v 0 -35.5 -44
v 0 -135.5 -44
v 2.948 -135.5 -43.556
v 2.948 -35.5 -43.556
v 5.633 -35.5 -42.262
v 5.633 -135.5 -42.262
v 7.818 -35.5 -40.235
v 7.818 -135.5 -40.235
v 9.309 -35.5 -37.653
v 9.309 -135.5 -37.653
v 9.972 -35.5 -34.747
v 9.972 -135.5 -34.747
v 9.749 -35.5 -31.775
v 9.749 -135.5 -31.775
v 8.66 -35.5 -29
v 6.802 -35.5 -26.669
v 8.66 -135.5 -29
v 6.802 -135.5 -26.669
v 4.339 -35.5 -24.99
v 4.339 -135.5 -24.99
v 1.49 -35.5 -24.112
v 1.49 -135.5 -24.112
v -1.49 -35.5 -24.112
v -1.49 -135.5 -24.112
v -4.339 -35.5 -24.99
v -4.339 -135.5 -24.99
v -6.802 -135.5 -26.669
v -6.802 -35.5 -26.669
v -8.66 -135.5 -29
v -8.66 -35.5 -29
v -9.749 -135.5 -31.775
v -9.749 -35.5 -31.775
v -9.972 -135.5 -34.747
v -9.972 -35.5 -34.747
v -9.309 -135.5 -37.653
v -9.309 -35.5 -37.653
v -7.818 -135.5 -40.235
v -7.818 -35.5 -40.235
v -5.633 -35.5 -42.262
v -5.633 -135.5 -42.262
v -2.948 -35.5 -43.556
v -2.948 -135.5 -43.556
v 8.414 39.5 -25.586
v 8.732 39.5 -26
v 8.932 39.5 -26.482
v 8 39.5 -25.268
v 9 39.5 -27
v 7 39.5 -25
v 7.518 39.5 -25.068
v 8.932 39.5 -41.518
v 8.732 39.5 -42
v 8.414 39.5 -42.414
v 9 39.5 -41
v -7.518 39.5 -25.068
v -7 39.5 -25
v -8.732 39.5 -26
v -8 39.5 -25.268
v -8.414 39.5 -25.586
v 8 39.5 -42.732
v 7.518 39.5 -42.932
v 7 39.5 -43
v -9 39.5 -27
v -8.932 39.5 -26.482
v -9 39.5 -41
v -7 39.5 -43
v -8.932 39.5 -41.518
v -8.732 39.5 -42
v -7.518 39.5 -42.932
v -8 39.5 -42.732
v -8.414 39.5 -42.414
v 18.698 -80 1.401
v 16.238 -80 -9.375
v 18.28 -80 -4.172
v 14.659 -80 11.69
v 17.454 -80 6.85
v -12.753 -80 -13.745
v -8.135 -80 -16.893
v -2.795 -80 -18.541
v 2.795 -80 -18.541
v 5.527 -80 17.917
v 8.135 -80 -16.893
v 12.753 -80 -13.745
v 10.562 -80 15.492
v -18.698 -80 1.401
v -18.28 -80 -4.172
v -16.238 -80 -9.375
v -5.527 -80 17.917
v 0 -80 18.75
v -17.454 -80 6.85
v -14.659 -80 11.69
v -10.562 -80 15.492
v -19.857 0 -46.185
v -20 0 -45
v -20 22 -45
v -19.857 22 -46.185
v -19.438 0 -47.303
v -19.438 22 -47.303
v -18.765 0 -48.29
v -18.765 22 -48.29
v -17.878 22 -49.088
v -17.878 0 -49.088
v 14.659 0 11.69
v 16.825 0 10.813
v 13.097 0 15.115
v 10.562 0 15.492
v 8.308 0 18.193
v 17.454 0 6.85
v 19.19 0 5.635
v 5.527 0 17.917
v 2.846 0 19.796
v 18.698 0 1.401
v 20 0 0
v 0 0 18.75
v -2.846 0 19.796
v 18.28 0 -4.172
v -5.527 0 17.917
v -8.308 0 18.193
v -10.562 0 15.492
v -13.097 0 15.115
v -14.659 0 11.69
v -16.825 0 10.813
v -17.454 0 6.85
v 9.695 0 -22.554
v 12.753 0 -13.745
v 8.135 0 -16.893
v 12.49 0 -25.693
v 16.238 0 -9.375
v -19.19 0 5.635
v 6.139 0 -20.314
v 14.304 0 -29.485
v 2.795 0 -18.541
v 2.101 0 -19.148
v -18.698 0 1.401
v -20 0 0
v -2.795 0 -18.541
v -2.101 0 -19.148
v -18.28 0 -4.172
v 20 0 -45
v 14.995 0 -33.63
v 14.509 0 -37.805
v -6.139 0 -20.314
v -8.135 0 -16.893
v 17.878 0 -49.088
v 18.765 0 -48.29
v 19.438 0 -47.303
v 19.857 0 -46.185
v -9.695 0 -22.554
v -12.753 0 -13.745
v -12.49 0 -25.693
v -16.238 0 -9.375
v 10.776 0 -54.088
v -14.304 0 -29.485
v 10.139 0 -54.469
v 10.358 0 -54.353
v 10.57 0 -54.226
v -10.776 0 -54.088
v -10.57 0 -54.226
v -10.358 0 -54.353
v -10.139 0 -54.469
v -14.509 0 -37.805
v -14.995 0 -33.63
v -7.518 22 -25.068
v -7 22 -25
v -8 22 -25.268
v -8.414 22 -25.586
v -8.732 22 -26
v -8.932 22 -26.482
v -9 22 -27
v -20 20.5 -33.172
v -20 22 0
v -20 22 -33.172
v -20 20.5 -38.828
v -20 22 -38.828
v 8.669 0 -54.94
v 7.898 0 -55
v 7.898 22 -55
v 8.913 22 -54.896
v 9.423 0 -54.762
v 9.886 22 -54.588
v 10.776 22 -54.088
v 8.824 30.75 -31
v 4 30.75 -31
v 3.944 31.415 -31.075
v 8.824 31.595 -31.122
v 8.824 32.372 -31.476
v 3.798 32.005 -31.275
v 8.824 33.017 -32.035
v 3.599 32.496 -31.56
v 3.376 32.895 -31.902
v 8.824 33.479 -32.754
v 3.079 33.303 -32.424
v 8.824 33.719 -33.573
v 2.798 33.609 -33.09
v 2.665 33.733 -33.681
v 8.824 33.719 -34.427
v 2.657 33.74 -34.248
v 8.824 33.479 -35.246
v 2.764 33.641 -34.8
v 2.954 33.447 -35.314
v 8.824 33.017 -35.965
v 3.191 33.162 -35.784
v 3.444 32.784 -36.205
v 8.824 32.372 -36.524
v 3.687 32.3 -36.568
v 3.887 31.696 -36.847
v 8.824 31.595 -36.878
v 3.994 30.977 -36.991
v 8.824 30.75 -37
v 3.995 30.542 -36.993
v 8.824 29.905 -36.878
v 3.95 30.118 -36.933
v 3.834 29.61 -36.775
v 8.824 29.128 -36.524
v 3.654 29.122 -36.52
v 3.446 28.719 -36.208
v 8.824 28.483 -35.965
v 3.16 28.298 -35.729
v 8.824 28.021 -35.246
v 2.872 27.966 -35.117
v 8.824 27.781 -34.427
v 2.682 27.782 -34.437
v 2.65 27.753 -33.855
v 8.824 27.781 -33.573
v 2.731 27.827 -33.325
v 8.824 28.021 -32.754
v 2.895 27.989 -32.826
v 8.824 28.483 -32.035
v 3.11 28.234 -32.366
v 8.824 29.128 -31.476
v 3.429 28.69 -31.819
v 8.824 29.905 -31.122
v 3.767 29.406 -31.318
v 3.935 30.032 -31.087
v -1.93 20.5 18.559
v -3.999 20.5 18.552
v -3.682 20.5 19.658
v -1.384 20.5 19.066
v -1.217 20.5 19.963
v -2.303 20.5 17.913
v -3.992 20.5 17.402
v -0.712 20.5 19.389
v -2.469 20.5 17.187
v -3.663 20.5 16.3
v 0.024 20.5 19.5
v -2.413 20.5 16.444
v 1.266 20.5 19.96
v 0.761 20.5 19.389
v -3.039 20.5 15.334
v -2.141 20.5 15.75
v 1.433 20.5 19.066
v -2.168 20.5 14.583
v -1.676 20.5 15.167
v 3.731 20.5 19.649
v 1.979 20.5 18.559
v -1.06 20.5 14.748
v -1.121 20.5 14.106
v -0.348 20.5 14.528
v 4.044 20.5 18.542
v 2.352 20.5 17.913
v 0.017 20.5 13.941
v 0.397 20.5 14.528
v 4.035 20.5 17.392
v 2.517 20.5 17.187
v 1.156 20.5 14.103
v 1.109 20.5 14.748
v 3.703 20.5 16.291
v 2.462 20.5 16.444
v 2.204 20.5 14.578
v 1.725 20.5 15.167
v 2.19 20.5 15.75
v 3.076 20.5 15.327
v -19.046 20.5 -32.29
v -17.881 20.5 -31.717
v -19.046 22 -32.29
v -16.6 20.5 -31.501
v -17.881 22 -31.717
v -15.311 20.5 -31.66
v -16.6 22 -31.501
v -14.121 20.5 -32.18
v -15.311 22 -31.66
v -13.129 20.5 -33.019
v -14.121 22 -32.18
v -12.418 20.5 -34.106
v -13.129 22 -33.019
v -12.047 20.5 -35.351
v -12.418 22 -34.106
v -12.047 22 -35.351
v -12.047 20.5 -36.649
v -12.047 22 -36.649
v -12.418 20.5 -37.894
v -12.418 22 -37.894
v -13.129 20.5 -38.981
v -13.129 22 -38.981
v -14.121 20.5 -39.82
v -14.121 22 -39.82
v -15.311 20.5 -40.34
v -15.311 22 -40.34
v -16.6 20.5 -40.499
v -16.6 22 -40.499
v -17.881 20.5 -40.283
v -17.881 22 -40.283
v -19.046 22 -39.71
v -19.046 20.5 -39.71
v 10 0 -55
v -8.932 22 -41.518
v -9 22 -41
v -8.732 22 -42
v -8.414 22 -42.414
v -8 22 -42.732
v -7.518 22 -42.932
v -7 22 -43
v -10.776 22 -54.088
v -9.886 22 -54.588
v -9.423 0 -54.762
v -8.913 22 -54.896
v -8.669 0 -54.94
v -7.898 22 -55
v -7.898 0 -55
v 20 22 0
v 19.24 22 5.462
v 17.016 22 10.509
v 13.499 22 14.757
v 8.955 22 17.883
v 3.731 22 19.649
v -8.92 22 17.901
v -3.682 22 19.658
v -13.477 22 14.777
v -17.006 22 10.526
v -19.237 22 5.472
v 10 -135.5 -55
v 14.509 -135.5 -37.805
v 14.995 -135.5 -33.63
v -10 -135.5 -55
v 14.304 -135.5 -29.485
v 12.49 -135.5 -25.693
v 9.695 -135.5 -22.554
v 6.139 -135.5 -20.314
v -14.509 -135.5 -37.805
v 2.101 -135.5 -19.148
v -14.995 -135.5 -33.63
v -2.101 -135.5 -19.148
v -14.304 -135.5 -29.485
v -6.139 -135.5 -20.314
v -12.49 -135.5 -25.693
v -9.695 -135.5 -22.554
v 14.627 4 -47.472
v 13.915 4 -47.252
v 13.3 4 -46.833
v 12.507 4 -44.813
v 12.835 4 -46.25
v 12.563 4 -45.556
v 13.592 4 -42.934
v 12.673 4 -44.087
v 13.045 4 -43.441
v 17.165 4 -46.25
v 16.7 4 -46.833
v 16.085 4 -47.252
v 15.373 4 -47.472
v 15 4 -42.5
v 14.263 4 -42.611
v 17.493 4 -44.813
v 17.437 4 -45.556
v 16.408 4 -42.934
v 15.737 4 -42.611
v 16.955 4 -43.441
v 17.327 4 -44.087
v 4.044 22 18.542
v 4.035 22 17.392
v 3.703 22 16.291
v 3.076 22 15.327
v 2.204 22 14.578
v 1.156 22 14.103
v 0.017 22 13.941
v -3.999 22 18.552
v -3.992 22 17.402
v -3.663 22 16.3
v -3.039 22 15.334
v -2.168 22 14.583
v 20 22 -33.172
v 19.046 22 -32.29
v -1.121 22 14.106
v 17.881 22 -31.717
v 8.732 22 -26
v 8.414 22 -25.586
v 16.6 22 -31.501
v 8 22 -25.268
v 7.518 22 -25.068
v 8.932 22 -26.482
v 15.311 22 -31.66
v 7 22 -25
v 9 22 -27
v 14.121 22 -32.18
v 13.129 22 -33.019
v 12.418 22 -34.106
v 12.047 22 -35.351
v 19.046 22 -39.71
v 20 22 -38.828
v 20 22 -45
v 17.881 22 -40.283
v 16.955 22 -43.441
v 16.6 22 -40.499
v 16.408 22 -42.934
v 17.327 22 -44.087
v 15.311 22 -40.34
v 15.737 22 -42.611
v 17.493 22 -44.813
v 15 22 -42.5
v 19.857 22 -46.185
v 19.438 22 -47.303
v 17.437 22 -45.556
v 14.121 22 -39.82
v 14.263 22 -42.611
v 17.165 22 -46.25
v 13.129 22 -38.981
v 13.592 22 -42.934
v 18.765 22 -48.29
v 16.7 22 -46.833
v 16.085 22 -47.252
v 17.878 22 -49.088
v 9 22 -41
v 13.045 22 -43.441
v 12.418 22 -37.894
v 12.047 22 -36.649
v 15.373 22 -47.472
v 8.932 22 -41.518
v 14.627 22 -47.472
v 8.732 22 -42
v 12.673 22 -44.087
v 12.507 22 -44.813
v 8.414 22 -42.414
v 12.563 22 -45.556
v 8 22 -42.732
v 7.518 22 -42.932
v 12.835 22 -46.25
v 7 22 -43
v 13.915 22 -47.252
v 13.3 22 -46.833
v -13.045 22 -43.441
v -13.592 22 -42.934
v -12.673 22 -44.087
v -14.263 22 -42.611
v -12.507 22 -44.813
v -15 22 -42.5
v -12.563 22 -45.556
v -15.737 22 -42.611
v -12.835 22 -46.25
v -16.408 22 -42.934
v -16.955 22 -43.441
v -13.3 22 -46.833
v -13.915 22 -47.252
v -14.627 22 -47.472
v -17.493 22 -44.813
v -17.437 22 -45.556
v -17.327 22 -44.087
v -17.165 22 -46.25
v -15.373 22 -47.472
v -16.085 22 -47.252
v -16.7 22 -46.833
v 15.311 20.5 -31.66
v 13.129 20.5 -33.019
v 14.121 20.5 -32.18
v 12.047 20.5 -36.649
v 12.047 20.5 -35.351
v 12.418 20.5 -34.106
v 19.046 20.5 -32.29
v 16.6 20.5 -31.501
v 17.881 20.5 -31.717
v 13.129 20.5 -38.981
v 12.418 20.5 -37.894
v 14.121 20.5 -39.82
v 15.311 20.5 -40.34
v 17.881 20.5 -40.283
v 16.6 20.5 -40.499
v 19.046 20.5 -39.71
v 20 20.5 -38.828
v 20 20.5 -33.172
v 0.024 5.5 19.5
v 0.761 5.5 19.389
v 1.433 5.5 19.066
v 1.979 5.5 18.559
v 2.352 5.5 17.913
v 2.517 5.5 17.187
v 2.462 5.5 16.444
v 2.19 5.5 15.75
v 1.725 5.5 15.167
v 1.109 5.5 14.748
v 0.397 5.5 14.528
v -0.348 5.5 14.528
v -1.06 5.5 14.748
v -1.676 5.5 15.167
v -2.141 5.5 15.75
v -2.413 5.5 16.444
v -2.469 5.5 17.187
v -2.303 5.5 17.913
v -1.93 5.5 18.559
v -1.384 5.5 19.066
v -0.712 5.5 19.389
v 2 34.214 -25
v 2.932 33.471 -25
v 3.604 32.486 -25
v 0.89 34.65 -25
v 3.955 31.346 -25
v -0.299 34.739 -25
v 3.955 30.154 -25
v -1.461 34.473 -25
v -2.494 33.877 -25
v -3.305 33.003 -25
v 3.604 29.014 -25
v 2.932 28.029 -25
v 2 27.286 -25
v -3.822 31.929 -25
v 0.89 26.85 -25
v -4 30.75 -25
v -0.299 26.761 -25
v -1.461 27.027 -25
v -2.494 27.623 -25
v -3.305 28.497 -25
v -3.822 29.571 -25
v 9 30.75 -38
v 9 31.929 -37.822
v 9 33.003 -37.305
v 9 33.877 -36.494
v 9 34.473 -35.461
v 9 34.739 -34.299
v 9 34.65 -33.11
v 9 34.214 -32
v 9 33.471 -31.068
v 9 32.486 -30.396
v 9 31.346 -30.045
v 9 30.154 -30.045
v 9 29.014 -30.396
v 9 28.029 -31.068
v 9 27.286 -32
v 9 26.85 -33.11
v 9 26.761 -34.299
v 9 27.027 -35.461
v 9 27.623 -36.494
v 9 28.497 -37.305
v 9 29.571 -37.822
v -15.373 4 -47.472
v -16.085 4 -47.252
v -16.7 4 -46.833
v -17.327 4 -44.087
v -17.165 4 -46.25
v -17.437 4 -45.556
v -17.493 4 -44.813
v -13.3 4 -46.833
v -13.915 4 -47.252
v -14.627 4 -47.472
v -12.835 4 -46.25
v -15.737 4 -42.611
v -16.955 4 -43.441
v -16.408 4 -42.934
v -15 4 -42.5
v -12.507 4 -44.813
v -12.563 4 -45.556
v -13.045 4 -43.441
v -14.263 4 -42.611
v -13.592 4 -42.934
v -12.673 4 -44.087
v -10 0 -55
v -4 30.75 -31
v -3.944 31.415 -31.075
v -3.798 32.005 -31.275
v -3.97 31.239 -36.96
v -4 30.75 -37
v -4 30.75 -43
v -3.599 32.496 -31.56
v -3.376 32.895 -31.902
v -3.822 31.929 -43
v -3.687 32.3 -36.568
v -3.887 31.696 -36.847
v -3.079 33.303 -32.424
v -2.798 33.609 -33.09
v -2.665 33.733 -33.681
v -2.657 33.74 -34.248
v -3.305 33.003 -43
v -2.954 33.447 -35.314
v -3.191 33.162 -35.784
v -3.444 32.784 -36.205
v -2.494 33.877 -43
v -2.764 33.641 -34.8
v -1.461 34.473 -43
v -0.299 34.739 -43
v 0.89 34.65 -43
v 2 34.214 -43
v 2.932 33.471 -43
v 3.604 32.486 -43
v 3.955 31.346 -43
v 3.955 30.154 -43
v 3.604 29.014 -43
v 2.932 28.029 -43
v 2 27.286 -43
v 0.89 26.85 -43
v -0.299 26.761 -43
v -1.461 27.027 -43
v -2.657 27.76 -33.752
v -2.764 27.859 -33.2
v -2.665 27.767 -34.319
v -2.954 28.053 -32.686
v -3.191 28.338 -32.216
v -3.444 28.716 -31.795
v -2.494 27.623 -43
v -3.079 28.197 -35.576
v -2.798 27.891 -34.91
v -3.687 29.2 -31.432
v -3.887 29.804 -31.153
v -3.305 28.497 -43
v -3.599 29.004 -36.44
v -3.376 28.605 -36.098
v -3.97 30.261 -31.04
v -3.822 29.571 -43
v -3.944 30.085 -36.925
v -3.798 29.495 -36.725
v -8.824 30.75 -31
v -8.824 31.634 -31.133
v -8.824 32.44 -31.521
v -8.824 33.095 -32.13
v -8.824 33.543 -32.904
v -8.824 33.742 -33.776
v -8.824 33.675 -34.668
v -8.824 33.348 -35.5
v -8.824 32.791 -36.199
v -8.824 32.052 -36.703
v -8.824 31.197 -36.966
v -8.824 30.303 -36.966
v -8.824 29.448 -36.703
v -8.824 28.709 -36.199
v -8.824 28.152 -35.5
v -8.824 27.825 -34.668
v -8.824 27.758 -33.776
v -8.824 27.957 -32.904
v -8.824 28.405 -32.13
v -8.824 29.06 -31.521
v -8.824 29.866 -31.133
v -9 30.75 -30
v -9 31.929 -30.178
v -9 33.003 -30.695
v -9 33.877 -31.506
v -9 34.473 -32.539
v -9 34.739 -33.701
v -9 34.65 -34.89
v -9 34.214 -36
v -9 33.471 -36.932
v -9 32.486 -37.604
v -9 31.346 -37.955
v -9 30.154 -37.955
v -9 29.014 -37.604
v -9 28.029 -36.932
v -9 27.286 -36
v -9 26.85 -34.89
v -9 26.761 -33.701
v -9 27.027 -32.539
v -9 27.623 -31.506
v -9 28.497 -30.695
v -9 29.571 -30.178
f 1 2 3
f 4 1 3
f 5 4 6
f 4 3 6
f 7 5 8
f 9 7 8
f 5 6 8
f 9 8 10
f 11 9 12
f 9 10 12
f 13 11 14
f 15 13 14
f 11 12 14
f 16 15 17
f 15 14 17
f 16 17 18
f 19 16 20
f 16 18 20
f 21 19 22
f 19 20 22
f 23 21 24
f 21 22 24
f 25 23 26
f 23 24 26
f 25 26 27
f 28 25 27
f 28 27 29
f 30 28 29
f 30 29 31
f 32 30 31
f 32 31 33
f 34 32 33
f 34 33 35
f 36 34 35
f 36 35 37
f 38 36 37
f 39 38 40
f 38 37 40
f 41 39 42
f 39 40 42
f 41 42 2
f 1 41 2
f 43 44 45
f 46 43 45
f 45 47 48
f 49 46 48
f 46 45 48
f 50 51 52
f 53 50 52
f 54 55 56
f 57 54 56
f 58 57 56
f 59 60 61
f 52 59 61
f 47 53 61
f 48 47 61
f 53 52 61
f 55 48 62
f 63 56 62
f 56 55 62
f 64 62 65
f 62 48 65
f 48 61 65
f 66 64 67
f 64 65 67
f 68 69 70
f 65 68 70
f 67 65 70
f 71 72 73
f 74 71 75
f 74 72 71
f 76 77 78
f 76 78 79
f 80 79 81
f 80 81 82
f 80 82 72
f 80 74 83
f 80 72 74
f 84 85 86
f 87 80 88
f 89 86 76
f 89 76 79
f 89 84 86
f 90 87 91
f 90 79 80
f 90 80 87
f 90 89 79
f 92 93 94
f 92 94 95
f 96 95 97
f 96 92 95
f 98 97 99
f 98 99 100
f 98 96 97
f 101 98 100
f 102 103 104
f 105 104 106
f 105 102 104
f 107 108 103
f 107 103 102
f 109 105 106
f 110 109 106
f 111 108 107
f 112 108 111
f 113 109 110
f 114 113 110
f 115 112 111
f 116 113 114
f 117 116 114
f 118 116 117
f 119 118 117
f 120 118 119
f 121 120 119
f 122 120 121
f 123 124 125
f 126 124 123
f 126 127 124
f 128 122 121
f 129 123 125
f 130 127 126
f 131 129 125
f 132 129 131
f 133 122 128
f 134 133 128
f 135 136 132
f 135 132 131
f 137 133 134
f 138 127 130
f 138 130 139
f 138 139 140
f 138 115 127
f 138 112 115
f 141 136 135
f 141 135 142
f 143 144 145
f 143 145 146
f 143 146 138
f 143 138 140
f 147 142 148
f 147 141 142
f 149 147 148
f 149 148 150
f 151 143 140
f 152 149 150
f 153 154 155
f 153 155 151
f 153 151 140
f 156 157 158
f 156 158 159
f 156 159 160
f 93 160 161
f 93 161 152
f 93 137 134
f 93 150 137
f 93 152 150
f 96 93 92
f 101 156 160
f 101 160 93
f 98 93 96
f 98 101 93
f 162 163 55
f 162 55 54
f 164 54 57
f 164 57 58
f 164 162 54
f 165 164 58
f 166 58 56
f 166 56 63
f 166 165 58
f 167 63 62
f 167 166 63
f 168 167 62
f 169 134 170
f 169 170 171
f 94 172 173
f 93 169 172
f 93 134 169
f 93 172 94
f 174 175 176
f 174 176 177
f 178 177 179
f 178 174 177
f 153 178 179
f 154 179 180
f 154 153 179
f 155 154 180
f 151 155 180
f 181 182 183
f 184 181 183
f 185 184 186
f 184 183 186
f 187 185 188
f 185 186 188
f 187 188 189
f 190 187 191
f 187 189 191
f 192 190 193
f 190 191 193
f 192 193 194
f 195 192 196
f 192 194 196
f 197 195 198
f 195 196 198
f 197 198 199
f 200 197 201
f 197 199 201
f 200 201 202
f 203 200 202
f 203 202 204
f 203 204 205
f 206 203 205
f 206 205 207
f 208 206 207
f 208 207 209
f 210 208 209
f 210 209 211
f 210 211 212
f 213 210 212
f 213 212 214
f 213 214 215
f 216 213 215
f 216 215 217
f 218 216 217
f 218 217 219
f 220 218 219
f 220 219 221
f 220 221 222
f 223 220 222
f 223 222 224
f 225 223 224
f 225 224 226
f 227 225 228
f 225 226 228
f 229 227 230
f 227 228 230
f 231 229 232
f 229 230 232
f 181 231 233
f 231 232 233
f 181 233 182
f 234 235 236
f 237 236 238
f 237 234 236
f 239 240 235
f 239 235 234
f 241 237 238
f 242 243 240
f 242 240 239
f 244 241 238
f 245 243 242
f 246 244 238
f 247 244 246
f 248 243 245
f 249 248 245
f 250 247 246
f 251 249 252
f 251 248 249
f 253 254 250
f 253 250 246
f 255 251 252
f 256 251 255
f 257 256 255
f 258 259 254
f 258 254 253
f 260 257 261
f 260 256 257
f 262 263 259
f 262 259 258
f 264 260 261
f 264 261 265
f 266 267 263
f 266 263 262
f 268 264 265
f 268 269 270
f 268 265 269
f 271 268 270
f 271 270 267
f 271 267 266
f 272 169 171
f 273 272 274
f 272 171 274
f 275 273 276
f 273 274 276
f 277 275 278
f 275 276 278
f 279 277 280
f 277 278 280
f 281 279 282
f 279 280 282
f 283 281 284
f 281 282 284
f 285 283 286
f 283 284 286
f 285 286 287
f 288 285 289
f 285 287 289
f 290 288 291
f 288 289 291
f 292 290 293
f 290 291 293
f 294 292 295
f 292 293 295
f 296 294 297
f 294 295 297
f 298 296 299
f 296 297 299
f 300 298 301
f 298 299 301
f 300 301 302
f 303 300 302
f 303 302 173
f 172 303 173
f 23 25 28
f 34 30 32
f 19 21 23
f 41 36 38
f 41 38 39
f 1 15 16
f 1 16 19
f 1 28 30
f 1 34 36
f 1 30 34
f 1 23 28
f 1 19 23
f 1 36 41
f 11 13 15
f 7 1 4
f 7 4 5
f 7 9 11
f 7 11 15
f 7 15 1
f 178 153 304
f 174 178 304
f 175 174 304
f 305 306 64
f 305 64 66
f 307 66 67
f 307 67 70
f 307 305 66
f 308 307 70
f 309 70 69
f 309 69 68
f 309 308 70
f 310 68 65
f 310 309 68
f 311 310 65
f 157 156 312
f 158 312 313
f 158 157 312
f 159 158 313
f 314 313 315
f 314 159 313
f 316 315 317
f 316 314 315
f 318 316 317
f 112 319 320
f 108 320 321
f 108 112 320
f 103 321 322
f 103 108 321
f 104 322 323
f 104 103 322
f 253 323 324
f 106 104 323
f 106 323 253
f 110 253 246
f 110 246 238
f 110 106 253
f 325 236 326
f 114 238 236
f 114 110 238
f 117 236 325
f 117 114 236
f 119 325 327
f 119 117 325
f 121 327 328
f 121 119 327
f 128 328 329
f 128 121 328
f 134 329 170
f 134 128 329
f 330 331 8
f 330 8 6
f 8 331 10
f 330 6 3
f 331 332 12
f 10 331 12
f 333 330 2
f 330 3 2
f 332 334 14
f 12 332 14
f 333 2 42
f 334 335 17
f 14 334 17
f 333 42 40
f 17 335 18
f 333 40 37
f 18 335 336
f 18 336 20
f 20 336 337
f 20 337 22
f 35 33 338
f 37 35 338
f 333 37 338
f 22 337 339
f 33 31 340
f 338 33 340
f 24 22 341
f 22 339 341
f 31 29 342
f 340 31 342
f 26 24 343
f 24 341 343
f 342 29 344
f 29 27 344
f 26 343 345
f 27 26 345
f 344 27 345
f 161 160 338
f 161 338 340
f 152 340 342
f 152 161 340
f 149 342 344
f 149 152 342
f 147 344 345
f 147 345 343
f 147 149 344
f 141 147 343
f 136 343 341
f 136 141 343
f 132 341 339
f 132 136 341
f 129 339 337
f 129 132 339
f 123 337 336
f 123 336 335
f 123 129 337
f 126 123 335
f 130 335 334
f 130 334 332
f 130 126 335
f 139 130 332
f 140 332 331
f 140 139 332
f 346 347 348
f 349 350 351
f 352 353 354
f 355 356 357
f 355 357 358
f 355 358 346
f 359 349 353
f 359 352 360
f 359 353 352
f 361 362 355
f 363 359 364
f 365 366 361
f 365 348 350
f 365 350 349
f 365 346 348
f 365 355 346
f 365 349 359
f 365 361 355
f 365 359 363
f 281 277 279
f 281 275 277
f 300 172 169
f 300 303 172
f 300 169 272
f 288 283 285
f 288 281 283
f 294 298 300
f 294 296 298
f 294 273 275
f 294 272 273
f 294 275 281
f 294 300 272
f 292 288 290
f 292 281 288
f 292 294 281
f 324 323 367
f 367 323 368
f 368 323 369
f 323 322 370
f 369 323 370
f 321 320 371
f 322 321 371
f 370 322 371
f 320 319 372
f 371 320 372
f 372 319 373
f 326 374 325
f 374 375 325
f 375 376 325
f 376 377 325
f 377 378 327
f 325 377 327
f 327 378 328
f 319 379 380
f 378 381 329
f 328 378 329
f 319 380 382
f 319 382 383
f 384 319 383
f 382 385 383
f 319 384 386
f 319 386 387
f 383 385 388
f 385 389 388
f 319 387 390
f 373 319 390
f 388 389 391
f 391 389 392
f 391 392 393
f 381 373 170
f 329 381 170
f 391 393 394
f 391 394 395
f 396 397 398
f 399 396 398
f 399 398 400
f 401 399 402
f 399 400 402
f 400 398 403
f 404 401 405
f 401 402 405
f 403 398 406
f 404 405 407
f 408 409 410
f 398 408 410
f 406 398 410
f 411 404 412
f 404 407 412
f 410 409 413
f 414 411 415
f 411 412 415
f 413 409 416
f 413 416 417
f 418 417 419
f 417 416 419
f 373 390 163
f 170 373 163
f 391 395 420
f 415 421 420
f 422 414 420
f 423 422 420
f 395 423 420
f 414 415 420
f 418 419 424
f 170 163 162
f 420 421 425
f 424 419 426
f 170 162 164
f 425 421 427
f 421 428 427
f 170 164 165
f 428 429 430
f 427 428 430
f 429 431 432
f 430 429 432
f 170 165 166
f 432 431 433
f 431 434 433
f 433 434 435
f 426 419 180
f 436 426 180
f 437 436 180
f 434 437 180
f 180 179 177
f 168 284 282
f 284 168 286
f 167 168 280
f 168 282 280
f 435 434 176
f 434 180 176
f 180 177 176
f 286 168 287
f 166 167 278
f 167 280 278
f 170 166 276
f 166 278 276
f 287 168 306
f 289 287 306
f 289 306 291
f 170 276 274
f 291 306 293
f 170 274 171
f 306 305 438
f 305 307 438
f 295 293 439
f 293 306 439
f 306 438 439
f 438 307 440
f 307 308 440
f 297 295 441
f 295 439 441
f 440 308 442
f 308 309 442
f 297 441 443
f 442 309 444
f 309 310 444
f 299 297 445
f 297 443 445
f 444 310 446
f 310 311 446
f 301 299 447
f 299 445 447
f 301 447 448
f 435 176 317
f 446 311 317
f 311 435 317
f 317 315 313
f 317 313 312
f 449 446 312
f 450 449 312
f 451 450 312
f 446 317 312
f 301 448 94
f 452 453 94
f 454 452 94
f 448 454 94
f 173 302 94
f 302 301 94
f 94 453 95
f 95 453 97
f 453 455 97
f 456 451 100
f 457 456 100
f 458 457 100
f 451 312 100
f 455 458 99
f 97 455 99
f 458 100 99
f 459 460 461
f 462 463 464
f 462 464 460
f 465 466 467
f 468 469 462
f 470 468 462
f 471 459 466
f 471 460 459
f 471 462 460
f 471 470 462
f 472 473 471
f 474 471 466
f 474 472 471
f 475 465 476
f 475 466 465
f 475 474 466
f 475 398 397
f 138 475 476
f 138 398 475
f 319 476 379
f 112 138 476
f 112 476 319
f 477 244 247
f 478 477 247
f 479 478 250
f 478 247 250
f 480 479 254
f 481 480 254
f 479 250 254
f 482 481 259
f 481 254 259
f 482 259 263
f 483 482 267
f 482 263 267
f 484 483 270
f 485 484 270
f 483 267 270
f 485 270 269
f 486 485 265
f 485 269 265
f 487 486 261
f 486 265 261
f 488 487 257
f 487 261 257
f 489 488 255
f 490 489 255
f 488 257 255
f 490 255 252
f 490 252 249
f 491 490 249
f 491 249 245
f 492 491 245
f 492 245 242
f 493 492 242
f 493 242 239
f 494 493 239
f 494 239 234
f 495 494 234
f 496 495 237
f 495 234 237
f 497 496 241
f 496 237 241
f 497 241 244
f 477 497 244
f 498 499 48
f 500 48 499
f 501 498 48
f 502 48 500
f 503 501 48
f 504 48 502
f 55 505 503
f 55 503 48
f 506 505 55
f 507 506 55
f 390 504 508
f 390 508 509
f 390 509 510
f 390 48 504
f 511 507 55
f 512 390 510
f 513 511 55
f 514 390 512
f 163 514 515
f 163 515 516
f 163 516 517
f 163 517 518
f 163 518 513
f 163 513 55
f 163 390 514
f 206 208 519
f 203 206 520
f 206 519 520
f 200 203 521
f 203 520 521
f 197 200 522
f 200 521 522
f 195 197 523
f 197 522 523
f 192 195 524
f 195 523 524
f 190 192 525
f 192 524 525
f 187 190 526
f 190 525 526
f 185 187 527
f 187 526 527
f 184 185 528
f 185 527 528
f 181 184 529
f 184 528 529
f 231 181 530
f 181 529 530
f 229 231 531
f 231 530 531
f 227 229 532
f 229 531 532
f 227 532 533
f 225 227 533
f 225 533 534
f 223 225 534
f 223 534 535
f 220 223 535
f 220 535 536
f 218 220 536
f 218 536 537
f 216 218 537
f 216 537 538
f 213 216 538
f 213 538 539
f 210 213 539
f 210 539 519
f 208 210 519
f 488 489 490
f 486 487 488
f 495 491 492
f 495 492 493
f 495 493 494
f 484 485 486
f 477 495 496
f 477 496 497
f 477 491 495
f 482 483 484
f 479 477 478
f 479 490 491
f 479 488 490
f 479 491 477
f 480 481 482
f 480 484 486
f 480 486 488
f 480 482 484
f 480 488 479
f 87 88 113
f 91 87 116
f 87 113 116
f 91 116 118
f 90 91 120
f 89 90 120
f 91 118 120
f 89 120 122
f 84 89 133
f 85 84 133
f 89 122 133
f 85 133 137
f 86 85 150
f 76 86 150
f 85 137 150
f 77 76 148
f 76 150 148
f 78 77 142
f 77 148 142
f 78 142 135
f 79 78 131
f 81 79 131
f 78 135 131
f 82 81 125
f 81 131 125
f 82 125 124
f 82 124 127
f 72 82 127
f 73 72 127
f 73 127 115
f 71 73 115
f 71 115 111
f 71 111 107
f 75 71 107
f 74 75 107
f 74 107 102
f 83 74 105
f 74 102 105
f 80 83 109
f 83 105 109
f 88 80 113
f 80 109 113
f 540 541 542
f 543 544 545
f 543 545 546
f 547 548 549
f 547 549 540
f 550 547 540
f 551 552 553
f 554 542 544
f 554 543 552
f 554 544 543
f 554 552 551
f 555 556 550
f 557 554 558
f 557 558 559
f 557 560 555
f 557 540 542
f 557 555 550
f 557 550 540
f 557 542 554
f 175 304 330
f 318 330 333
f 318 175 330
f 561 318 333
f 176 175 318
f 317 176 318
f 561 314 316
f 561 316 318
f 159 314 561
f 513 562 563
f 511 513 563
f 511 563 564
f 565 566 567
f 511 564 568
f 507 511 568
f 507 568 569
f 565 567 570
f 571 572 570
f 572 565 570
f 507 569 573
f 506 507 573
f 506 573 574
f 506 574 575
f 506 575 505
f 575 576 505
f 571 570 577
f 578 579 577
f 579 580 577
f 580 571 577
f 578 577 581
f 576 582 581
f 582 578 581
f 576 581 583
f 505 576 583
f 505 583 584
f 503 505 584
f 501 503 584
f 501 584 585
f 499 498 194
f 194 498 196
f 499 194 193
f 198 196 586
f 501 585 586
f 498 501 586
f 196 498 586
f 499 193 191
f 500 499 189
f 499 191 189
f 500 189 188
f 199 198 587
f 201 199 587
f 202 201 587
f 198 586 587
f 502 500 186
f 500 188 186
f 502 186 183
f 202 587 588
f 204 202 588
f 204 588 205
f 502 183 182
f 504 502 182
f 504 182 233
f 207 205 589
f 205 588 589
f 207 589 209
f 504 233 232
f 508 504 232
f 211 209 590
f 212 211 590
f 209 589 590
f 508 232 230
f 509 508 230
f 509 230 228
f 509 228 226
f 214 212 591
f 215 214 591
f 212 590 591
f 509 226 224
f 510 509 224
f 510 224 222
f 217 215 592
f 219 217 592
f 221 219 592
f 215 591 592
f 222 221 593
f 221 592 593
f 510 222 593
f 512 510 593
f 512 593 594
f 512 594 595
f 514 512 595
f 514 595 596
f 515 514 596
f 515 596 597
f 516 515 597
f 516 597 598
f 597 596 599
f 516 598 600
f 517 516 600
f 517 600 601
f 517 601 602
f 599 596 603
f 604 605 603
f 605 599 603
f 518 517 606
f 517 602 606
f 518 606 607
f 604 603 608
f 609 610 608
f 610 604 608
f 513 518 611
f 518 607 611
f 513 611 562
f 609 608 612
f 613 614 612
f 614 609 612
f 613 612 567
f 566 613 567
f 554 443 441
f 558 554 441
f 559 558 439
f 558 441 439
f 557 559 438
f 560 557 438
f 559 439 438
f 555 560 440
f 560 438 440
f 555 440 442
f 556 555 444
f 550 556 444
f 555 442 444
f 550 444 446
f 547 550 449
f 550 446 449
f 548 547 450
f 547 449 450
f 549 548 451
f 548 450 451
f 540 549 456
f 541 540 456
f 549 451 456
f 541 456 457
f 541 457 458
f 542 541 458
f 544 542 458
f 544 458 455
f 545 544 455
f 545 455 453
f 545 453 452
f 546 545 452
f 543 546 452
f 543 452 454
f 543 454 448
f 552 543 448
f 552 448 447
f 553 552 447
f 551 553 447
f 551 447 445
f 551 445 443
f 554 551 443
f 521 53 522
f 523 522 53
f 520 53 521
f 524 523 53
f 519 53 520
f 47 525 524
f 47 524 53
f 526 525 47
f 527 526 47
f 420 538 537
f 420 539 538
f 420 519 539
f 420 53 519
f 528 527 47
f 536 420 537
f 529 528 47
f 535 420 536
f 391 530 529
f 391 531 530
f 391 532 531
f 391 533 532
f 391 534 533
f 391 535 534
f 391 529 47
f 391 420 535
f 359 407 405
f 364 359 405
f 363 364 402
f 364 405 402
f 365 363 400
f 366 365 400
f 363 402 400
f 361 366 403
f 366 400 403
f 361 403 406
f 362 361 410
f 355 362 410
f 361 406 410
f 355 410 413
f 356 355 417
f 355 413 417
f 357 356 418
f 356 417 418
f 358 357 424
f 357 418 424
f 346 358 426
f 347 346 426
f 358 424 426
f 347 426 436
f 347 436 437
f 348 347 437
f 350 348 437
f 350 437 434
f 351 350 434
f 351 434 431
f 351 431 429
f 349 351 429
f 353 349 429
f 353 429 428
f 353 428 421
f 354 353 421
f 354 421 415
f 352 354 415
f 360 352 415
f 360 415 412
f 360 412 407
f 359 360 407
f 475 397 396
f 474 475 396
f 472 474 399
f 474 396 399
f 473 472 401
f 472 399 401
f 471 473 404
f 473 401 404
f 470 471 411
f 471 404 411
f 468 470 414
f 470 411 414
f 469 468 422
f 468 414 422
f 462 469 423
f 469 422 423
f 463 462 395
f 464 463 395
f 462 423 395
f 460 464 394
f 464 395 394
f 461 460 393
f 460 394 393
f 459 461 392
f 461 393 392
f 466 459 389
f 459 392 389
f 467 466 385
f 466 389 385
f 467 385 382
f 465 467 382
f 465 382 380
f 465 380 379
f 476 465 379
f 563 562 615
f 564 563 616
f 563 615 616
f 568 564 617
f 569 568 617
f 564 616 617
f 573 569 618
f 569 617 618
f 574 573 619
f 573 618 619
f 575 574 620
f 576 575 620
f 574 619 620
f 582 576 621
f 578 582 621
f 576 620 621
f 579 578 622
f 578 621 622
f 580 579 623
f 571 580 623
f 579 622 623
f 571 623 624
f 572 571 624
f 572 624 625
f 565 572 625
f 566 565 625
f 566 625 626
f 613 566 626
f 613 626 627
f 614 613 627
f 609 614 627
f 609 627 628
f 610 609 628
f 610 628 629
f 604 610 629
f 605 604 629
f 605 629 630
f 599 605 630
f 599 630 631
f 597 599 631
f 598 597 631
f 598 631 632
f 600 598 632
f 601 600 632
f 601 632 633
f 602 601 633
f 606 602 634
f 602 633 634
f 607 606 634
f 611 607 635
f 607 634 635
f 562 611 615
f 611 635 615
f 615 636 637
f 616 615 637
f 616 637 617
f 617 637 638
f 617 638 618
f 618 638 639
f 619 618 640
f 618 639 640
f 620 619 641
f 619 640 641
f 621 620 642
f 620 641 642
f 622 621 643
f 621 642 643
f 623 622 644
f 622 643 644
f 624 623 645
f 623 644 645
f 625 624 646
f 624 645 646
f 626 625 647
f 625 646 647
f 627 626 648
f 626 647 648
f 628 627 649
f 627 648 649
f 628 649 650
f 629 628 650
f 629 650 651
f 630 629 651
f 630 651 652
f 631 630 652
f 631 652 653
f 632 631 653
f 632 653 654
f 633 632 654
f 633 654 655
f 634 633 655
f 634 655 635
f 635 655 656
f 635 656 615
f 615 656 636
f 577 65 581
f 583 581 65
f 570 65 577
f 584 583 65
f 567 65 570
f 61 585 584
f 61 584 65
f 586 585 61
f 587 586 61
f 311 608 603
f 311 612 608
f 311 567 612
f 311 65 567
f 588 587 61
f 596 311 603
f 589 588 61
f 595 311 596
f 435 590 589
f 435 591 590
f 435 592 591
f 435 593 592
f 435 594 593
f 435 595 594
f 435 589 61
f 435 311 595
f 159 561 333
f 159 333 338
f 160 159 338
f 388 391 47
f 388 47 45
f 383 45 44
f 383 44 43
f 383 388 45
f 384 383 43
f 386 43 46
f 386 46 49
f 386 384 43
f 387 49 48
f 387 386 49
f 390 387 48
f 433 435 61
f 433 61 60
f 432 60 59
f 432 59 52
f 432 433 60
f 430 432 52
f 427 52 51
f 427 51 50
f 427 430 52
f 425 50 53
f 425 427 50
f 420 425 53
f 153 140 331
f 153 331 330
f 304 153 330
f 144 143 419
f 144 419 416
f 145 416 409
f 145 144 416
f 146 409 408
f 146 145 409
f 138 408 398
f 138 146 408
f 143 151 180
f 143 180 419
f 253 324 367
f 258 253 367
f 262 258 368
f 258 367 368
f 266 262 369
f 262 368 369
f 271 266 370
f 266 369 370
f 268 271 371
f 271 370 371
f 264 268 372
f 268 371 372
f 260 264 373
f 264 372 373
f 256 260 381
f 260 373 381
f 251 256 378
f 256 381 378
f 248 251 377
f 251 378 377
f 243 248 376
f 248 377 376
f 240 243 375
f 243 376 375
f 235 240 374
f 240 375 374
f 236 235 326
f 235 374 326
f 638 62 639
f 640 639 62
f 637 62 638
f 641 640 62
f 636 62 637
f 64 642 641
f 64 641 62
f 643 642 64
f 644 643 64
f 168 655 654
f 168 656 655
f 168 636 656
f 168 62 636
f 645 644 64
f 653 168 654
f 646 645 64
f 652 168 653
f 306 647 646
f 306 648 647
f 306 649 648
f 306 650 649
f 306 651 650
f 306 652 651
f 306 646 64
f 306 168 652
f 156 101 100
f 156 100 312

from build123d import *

# Parameters (mm, degrees)
SALIENTE_EXTRUIR1_DEPTH  = 22
CROQUIS3_R               = 2.5
CROQUIS3_R_2             = 4.5
CORTAR_EXTRUIR2_DEPTH    = 1.5
CROQUIS4_R               = 2.5
CORTAR_EXTRUIR3_DEPTH    = 18
CROQUIS5_R               = 4.05861195
CORTAR_EXTRUIR4_DEPTH    = 1.5
CROQUIS6_R               = 2.5
CORTAR_EXTRUIR5_DEPTH    = 15
SALIENTE_EXTRUIR2_DEPTH  = 19
CROQUIS8_R               = 3
CORTAR_EXTRUIR7_DEPTH    = 19
CROQUIS9_R               = 4
CORTAR_EXTRUIR10_DEPTH   = 0.5
CORTAR_EXTRUIR10_DRAFT   = -80
CROQUIS10_R              = 4
CORTAR_EXTRUIR11_DEPTH   = 0.5
CORTAR_EXTRUIR11_DRAFT   = -80
SALIENTE_EXTRUIR3_DEPTH  = 135.5
CROQUIS12_R              = 10
CORTAR_EXTRUIR12_DEPTH   = 100
CROQUIS15_R              = 18.75
SALIENTE_EXTRUIR10_DEPTH = 80
CROQUIS16_R              = 4
CORTAR_EXTRUIR13_DEPTH   = 151.762230018


with BuildPart() as part:
    # Croquis2 → Saliente-Extruir1 (new body)
    with BuildSketch(Plane(origin=(0, 0, 0), x_dir=(1, 0, 0), z_dir=(0, 1, 0))):
        with BuildLine():
            Line((-17.878262929, 49.088471905), (-10.775937662, 54.088471905))
            ThreePointArc((-10.775937662, 54.088471905), (-9.407250911, 54.766673868), (-7.897674733, 55))
            Line((-7.897674733, 55), (7.897674733, 55))
            ThreePointArc((7.897674733, 55), (9.407250911, 54.766673868), (10.775937662, 54.088471905))
            Line((10.775937662, 54.088471905), (17.878262929, 49.088471905))
            ThreePointArc((17.878262929, 49.088471905), (19.437978968, 47.303115863), (20, 45))
            Line((20, 45), (20, 0))
            ThreePointArc((20, 0), (0, -20), (-20, 0))
            Line((-20, 0), (-20, 45))
            ThreePointArc((-20, 45), (-19.437978968, 47.303115863), (-17.878262929, 49.088471905))
        make_face()
    extrude(amount=SALIENTE_EXTRUIR1_DEPTH)

    # Croquis3 → Cortar-Extruir2 (cut)
    with BuildSketch(Plane(origin=(0, 22, 0), x_dir=(1, 0, 0), z_dir=(0, 1, 0))):
        with Locations(Location((-15, 45, 0), (0, 0, 270))):
            Circle(CROQUIS3_R)
        with Locations(Location((15, 45, 0), (0, 0, 270))):
            Circle(CROQUIS3_R)
        with Locations((-16.5, 36)):
            Circle(CROQUIS3_R_2)
        with Locations((16.5, 36)):
            Circle(CROQUIS3_R_2)
    extrude(amount=-CORTAR_EXTRUIR2_DEPTH, mode=Mode.SUBTRACT)

    # Croquis4 → Cortar-Extruir3 (cut)
    with BuildSketch(Plane(origin=(0, 22, 0), x_dir=(1, 0, 0), z_dir=(0, 1, 0))):
        with Locations(Location((-15, 45, 0), (0, 0, 270))):
            Circle(CROQUIS4_R)
        with Locations(Location((15, 45, 0), (0, 0, 270))):
            Circle(CROQUIS4_R)
    extrude(amount=-CORTAR_EXTRUIR3_DEPTH, mode=Mode.SUBTRACT)

    # Croquis5 → Cortar-Extruir4 (cut)
    with BuildSketch(Plane(origin=(0, 22, 0), x_dir=(1, 0, 0), z_dir=(0, 1, 0))):
        with Locations((0.022007055, -18)):
            Circle(CROQUIS5_R)
    extrude(amount=-CORTAR_EXTRUIR4_DEPTH, mode=Mode.SUBTRACT)

    # Croquis6 → Cortar-Extruir5 (cut)
    with BuildSketch(Plane(origin=(0, 20.5, 0), x_dir=(1, 0, 0), z_dir=(0, 1, 0))):
        with Locations(Location((0.024452265, -16.999985052, 0), (0, 0, 270))):
            Circle(CROQUIS6_R)
    extrude(amount=-CORTAR_EXTRUIR5_DEPTH, mode=Mode.SUBTRACT)

    # Croquis7 → Saliente-Extruir2 (add)
    with BuildSketch(Plane(origin=(0, 20.5, 0), x_dir=(1, 0, 0), z_dir=(0, 1, 0))):
        with BuildLine():
            Line((7, 25), (-7, 25))
            ThreePointArc((-7, 25), (-8.414213562, 25.585786438), (-9, 27))
            Line((-9, 27), (-9, 41))
            ThreePointArc((-9, 41), (-8.414213562, 42.414213562), (-7, 43))
            Line((-7, 43), (7, 43))
            ThreePointArc((7, 43), (8.414213562, 42.414213562), (9, 41))
            Line((9, 41), (9, 27))
            ThreePointArc((9, 27), (8.414213562, 25.585786438), (7, 25))
        make_face()
    extrude(amount=SALIENTE_EXTRUIR2_DEPTH)

    # Croquis8 → Cortar-Extruir7 (cut)
    with BuildSketch(Plane.ZY.offset(9)):
        with Locations((-34, 30.75)):
            Circle(CROQUIS8_R)
    extrude(amount=-CORTAR_EXTRUIR7_DEPTH, mode=Mode.SUBTRACT)


with BuildPart() as cortar_extruir10_tool:
    # Croquis9 → Cortar-Extruir10 (with draft: the straight prism first)
    with BuildSketch(Plane.ZY.offset(9)):
        with Locations((-34, 30.75)):
            Circle(CROQUIS9_R)
    extrude(amount=-CORTAR_EXTRUIR10_DEPTH)
    # Cortar-Extruir10: the draft: its side faces are tilted about the plane it starts from
    cortar_extruir10_sides = [cortar_extruir10_tool.faces().sort_by_distance(p)[0] for p in [
        (-8.75, 30.75, -38),
    ]]
    draft(cortar_extruir10_sides, Plane.ZY.offset(9), CORTAR_EXTRUIR10_DRAFT)


with BuildPart() as part_1:
    add(part.part)

    # Cortar-Extruir10: cut by cortar_extruir10_tool
    add(cortar_extruir10_tool.part, mode=Mode.SUBTRACT)


with BuildPart() as cortar_extruir11_tool:
    # Croquis10 → Cortar-Extruir11 (with draft: the straight prism first)
    with BuildSketch(Plane(origin=(9, 0, 0), x_dir=(0, 0, -1), z_dir=(1, 0, 0))):
        with Locations((34, 30.75)):
            Circle(CROQUIS10_R)
    extrude(amount=-CORTAR_EXTRUIR11_DEPTH)
    # Cortar-Extruir11: the draft: its side faces are tilted about the plane it starts from
    cortar_extruir11_sides = [cortar_extruir11_tool.faces().sort_by_distance(p)[0] for p in [
        (8.75, 30.75, -30),
    ]]
    draft(cortar_extruir11_sides, Plane(origin=(9, 0, 0), x_dir=(0, 0, -1), z_dir=(1, 0, 0)), CORTAR_EXTRUIR11_DRAFT)


with BuildPart() as part_2:
    add(part_1.part)

    # Cortar-Extruir11: cut by cortar_extruir11_tool
    add(cortar_extruir11_tool.part, mode=Mode.SUBTRACT)

    # Croquis11 → Saliente-Extruir3 (add)
    with BuildSketch(Plane.XZ):
        with BuildLine():
            Line((-10, -55), (-14.509357639, -37.805067791))
            ThreePointArc((-14.509357639, -37.805067791), (0, -19), (14.509357639, -37.805067791))
            Line((14.509357639, -37.805067791), (10, -55))
            Line((10, -55), (-10, -55))
        make_face()
    extrude(amount=SALIENTE_EXTRUIR3_DEPTH)

    # Croquis12 → Cortar-Extruir12 (cut)
    with BuildSketch(Plane.XZ.offset(135.5)):
        with Locations(Location((0, -34, 0), (0, 0, 270))):
            Circle(CROQUIS12_R)
    extrude(amount=-CORTAR_EXTRUIR12_DEPTH, mode=Mode.SUBTRACT)

    # Croquis15 → Saliente-Extruir10 (add)
    with BuildSketch(Plane.XZ):
        with Locations(Location((0, 0, 0), (0, 0, 90))):
            Circle(CROQUIS15_R)
    extrude(amount=SALIENTE_EXTRUIR10_DEPTH)

    # Croquis16 → Cortar-Extruir13 (cut, through all)
    with BuildSketch(Plane(origin=(0, 0, -43), x_dir=(-1, 0, 0), z_dir=(0, 0, -1))):
        with Locations((0, 30.75)):
            Circle(CROQUIS16_R)
    extrude(amount=-CORTAR_EXTRUIR13_DEPTH, mode=Mode.SUBTRACT)


solid = part_2.part
